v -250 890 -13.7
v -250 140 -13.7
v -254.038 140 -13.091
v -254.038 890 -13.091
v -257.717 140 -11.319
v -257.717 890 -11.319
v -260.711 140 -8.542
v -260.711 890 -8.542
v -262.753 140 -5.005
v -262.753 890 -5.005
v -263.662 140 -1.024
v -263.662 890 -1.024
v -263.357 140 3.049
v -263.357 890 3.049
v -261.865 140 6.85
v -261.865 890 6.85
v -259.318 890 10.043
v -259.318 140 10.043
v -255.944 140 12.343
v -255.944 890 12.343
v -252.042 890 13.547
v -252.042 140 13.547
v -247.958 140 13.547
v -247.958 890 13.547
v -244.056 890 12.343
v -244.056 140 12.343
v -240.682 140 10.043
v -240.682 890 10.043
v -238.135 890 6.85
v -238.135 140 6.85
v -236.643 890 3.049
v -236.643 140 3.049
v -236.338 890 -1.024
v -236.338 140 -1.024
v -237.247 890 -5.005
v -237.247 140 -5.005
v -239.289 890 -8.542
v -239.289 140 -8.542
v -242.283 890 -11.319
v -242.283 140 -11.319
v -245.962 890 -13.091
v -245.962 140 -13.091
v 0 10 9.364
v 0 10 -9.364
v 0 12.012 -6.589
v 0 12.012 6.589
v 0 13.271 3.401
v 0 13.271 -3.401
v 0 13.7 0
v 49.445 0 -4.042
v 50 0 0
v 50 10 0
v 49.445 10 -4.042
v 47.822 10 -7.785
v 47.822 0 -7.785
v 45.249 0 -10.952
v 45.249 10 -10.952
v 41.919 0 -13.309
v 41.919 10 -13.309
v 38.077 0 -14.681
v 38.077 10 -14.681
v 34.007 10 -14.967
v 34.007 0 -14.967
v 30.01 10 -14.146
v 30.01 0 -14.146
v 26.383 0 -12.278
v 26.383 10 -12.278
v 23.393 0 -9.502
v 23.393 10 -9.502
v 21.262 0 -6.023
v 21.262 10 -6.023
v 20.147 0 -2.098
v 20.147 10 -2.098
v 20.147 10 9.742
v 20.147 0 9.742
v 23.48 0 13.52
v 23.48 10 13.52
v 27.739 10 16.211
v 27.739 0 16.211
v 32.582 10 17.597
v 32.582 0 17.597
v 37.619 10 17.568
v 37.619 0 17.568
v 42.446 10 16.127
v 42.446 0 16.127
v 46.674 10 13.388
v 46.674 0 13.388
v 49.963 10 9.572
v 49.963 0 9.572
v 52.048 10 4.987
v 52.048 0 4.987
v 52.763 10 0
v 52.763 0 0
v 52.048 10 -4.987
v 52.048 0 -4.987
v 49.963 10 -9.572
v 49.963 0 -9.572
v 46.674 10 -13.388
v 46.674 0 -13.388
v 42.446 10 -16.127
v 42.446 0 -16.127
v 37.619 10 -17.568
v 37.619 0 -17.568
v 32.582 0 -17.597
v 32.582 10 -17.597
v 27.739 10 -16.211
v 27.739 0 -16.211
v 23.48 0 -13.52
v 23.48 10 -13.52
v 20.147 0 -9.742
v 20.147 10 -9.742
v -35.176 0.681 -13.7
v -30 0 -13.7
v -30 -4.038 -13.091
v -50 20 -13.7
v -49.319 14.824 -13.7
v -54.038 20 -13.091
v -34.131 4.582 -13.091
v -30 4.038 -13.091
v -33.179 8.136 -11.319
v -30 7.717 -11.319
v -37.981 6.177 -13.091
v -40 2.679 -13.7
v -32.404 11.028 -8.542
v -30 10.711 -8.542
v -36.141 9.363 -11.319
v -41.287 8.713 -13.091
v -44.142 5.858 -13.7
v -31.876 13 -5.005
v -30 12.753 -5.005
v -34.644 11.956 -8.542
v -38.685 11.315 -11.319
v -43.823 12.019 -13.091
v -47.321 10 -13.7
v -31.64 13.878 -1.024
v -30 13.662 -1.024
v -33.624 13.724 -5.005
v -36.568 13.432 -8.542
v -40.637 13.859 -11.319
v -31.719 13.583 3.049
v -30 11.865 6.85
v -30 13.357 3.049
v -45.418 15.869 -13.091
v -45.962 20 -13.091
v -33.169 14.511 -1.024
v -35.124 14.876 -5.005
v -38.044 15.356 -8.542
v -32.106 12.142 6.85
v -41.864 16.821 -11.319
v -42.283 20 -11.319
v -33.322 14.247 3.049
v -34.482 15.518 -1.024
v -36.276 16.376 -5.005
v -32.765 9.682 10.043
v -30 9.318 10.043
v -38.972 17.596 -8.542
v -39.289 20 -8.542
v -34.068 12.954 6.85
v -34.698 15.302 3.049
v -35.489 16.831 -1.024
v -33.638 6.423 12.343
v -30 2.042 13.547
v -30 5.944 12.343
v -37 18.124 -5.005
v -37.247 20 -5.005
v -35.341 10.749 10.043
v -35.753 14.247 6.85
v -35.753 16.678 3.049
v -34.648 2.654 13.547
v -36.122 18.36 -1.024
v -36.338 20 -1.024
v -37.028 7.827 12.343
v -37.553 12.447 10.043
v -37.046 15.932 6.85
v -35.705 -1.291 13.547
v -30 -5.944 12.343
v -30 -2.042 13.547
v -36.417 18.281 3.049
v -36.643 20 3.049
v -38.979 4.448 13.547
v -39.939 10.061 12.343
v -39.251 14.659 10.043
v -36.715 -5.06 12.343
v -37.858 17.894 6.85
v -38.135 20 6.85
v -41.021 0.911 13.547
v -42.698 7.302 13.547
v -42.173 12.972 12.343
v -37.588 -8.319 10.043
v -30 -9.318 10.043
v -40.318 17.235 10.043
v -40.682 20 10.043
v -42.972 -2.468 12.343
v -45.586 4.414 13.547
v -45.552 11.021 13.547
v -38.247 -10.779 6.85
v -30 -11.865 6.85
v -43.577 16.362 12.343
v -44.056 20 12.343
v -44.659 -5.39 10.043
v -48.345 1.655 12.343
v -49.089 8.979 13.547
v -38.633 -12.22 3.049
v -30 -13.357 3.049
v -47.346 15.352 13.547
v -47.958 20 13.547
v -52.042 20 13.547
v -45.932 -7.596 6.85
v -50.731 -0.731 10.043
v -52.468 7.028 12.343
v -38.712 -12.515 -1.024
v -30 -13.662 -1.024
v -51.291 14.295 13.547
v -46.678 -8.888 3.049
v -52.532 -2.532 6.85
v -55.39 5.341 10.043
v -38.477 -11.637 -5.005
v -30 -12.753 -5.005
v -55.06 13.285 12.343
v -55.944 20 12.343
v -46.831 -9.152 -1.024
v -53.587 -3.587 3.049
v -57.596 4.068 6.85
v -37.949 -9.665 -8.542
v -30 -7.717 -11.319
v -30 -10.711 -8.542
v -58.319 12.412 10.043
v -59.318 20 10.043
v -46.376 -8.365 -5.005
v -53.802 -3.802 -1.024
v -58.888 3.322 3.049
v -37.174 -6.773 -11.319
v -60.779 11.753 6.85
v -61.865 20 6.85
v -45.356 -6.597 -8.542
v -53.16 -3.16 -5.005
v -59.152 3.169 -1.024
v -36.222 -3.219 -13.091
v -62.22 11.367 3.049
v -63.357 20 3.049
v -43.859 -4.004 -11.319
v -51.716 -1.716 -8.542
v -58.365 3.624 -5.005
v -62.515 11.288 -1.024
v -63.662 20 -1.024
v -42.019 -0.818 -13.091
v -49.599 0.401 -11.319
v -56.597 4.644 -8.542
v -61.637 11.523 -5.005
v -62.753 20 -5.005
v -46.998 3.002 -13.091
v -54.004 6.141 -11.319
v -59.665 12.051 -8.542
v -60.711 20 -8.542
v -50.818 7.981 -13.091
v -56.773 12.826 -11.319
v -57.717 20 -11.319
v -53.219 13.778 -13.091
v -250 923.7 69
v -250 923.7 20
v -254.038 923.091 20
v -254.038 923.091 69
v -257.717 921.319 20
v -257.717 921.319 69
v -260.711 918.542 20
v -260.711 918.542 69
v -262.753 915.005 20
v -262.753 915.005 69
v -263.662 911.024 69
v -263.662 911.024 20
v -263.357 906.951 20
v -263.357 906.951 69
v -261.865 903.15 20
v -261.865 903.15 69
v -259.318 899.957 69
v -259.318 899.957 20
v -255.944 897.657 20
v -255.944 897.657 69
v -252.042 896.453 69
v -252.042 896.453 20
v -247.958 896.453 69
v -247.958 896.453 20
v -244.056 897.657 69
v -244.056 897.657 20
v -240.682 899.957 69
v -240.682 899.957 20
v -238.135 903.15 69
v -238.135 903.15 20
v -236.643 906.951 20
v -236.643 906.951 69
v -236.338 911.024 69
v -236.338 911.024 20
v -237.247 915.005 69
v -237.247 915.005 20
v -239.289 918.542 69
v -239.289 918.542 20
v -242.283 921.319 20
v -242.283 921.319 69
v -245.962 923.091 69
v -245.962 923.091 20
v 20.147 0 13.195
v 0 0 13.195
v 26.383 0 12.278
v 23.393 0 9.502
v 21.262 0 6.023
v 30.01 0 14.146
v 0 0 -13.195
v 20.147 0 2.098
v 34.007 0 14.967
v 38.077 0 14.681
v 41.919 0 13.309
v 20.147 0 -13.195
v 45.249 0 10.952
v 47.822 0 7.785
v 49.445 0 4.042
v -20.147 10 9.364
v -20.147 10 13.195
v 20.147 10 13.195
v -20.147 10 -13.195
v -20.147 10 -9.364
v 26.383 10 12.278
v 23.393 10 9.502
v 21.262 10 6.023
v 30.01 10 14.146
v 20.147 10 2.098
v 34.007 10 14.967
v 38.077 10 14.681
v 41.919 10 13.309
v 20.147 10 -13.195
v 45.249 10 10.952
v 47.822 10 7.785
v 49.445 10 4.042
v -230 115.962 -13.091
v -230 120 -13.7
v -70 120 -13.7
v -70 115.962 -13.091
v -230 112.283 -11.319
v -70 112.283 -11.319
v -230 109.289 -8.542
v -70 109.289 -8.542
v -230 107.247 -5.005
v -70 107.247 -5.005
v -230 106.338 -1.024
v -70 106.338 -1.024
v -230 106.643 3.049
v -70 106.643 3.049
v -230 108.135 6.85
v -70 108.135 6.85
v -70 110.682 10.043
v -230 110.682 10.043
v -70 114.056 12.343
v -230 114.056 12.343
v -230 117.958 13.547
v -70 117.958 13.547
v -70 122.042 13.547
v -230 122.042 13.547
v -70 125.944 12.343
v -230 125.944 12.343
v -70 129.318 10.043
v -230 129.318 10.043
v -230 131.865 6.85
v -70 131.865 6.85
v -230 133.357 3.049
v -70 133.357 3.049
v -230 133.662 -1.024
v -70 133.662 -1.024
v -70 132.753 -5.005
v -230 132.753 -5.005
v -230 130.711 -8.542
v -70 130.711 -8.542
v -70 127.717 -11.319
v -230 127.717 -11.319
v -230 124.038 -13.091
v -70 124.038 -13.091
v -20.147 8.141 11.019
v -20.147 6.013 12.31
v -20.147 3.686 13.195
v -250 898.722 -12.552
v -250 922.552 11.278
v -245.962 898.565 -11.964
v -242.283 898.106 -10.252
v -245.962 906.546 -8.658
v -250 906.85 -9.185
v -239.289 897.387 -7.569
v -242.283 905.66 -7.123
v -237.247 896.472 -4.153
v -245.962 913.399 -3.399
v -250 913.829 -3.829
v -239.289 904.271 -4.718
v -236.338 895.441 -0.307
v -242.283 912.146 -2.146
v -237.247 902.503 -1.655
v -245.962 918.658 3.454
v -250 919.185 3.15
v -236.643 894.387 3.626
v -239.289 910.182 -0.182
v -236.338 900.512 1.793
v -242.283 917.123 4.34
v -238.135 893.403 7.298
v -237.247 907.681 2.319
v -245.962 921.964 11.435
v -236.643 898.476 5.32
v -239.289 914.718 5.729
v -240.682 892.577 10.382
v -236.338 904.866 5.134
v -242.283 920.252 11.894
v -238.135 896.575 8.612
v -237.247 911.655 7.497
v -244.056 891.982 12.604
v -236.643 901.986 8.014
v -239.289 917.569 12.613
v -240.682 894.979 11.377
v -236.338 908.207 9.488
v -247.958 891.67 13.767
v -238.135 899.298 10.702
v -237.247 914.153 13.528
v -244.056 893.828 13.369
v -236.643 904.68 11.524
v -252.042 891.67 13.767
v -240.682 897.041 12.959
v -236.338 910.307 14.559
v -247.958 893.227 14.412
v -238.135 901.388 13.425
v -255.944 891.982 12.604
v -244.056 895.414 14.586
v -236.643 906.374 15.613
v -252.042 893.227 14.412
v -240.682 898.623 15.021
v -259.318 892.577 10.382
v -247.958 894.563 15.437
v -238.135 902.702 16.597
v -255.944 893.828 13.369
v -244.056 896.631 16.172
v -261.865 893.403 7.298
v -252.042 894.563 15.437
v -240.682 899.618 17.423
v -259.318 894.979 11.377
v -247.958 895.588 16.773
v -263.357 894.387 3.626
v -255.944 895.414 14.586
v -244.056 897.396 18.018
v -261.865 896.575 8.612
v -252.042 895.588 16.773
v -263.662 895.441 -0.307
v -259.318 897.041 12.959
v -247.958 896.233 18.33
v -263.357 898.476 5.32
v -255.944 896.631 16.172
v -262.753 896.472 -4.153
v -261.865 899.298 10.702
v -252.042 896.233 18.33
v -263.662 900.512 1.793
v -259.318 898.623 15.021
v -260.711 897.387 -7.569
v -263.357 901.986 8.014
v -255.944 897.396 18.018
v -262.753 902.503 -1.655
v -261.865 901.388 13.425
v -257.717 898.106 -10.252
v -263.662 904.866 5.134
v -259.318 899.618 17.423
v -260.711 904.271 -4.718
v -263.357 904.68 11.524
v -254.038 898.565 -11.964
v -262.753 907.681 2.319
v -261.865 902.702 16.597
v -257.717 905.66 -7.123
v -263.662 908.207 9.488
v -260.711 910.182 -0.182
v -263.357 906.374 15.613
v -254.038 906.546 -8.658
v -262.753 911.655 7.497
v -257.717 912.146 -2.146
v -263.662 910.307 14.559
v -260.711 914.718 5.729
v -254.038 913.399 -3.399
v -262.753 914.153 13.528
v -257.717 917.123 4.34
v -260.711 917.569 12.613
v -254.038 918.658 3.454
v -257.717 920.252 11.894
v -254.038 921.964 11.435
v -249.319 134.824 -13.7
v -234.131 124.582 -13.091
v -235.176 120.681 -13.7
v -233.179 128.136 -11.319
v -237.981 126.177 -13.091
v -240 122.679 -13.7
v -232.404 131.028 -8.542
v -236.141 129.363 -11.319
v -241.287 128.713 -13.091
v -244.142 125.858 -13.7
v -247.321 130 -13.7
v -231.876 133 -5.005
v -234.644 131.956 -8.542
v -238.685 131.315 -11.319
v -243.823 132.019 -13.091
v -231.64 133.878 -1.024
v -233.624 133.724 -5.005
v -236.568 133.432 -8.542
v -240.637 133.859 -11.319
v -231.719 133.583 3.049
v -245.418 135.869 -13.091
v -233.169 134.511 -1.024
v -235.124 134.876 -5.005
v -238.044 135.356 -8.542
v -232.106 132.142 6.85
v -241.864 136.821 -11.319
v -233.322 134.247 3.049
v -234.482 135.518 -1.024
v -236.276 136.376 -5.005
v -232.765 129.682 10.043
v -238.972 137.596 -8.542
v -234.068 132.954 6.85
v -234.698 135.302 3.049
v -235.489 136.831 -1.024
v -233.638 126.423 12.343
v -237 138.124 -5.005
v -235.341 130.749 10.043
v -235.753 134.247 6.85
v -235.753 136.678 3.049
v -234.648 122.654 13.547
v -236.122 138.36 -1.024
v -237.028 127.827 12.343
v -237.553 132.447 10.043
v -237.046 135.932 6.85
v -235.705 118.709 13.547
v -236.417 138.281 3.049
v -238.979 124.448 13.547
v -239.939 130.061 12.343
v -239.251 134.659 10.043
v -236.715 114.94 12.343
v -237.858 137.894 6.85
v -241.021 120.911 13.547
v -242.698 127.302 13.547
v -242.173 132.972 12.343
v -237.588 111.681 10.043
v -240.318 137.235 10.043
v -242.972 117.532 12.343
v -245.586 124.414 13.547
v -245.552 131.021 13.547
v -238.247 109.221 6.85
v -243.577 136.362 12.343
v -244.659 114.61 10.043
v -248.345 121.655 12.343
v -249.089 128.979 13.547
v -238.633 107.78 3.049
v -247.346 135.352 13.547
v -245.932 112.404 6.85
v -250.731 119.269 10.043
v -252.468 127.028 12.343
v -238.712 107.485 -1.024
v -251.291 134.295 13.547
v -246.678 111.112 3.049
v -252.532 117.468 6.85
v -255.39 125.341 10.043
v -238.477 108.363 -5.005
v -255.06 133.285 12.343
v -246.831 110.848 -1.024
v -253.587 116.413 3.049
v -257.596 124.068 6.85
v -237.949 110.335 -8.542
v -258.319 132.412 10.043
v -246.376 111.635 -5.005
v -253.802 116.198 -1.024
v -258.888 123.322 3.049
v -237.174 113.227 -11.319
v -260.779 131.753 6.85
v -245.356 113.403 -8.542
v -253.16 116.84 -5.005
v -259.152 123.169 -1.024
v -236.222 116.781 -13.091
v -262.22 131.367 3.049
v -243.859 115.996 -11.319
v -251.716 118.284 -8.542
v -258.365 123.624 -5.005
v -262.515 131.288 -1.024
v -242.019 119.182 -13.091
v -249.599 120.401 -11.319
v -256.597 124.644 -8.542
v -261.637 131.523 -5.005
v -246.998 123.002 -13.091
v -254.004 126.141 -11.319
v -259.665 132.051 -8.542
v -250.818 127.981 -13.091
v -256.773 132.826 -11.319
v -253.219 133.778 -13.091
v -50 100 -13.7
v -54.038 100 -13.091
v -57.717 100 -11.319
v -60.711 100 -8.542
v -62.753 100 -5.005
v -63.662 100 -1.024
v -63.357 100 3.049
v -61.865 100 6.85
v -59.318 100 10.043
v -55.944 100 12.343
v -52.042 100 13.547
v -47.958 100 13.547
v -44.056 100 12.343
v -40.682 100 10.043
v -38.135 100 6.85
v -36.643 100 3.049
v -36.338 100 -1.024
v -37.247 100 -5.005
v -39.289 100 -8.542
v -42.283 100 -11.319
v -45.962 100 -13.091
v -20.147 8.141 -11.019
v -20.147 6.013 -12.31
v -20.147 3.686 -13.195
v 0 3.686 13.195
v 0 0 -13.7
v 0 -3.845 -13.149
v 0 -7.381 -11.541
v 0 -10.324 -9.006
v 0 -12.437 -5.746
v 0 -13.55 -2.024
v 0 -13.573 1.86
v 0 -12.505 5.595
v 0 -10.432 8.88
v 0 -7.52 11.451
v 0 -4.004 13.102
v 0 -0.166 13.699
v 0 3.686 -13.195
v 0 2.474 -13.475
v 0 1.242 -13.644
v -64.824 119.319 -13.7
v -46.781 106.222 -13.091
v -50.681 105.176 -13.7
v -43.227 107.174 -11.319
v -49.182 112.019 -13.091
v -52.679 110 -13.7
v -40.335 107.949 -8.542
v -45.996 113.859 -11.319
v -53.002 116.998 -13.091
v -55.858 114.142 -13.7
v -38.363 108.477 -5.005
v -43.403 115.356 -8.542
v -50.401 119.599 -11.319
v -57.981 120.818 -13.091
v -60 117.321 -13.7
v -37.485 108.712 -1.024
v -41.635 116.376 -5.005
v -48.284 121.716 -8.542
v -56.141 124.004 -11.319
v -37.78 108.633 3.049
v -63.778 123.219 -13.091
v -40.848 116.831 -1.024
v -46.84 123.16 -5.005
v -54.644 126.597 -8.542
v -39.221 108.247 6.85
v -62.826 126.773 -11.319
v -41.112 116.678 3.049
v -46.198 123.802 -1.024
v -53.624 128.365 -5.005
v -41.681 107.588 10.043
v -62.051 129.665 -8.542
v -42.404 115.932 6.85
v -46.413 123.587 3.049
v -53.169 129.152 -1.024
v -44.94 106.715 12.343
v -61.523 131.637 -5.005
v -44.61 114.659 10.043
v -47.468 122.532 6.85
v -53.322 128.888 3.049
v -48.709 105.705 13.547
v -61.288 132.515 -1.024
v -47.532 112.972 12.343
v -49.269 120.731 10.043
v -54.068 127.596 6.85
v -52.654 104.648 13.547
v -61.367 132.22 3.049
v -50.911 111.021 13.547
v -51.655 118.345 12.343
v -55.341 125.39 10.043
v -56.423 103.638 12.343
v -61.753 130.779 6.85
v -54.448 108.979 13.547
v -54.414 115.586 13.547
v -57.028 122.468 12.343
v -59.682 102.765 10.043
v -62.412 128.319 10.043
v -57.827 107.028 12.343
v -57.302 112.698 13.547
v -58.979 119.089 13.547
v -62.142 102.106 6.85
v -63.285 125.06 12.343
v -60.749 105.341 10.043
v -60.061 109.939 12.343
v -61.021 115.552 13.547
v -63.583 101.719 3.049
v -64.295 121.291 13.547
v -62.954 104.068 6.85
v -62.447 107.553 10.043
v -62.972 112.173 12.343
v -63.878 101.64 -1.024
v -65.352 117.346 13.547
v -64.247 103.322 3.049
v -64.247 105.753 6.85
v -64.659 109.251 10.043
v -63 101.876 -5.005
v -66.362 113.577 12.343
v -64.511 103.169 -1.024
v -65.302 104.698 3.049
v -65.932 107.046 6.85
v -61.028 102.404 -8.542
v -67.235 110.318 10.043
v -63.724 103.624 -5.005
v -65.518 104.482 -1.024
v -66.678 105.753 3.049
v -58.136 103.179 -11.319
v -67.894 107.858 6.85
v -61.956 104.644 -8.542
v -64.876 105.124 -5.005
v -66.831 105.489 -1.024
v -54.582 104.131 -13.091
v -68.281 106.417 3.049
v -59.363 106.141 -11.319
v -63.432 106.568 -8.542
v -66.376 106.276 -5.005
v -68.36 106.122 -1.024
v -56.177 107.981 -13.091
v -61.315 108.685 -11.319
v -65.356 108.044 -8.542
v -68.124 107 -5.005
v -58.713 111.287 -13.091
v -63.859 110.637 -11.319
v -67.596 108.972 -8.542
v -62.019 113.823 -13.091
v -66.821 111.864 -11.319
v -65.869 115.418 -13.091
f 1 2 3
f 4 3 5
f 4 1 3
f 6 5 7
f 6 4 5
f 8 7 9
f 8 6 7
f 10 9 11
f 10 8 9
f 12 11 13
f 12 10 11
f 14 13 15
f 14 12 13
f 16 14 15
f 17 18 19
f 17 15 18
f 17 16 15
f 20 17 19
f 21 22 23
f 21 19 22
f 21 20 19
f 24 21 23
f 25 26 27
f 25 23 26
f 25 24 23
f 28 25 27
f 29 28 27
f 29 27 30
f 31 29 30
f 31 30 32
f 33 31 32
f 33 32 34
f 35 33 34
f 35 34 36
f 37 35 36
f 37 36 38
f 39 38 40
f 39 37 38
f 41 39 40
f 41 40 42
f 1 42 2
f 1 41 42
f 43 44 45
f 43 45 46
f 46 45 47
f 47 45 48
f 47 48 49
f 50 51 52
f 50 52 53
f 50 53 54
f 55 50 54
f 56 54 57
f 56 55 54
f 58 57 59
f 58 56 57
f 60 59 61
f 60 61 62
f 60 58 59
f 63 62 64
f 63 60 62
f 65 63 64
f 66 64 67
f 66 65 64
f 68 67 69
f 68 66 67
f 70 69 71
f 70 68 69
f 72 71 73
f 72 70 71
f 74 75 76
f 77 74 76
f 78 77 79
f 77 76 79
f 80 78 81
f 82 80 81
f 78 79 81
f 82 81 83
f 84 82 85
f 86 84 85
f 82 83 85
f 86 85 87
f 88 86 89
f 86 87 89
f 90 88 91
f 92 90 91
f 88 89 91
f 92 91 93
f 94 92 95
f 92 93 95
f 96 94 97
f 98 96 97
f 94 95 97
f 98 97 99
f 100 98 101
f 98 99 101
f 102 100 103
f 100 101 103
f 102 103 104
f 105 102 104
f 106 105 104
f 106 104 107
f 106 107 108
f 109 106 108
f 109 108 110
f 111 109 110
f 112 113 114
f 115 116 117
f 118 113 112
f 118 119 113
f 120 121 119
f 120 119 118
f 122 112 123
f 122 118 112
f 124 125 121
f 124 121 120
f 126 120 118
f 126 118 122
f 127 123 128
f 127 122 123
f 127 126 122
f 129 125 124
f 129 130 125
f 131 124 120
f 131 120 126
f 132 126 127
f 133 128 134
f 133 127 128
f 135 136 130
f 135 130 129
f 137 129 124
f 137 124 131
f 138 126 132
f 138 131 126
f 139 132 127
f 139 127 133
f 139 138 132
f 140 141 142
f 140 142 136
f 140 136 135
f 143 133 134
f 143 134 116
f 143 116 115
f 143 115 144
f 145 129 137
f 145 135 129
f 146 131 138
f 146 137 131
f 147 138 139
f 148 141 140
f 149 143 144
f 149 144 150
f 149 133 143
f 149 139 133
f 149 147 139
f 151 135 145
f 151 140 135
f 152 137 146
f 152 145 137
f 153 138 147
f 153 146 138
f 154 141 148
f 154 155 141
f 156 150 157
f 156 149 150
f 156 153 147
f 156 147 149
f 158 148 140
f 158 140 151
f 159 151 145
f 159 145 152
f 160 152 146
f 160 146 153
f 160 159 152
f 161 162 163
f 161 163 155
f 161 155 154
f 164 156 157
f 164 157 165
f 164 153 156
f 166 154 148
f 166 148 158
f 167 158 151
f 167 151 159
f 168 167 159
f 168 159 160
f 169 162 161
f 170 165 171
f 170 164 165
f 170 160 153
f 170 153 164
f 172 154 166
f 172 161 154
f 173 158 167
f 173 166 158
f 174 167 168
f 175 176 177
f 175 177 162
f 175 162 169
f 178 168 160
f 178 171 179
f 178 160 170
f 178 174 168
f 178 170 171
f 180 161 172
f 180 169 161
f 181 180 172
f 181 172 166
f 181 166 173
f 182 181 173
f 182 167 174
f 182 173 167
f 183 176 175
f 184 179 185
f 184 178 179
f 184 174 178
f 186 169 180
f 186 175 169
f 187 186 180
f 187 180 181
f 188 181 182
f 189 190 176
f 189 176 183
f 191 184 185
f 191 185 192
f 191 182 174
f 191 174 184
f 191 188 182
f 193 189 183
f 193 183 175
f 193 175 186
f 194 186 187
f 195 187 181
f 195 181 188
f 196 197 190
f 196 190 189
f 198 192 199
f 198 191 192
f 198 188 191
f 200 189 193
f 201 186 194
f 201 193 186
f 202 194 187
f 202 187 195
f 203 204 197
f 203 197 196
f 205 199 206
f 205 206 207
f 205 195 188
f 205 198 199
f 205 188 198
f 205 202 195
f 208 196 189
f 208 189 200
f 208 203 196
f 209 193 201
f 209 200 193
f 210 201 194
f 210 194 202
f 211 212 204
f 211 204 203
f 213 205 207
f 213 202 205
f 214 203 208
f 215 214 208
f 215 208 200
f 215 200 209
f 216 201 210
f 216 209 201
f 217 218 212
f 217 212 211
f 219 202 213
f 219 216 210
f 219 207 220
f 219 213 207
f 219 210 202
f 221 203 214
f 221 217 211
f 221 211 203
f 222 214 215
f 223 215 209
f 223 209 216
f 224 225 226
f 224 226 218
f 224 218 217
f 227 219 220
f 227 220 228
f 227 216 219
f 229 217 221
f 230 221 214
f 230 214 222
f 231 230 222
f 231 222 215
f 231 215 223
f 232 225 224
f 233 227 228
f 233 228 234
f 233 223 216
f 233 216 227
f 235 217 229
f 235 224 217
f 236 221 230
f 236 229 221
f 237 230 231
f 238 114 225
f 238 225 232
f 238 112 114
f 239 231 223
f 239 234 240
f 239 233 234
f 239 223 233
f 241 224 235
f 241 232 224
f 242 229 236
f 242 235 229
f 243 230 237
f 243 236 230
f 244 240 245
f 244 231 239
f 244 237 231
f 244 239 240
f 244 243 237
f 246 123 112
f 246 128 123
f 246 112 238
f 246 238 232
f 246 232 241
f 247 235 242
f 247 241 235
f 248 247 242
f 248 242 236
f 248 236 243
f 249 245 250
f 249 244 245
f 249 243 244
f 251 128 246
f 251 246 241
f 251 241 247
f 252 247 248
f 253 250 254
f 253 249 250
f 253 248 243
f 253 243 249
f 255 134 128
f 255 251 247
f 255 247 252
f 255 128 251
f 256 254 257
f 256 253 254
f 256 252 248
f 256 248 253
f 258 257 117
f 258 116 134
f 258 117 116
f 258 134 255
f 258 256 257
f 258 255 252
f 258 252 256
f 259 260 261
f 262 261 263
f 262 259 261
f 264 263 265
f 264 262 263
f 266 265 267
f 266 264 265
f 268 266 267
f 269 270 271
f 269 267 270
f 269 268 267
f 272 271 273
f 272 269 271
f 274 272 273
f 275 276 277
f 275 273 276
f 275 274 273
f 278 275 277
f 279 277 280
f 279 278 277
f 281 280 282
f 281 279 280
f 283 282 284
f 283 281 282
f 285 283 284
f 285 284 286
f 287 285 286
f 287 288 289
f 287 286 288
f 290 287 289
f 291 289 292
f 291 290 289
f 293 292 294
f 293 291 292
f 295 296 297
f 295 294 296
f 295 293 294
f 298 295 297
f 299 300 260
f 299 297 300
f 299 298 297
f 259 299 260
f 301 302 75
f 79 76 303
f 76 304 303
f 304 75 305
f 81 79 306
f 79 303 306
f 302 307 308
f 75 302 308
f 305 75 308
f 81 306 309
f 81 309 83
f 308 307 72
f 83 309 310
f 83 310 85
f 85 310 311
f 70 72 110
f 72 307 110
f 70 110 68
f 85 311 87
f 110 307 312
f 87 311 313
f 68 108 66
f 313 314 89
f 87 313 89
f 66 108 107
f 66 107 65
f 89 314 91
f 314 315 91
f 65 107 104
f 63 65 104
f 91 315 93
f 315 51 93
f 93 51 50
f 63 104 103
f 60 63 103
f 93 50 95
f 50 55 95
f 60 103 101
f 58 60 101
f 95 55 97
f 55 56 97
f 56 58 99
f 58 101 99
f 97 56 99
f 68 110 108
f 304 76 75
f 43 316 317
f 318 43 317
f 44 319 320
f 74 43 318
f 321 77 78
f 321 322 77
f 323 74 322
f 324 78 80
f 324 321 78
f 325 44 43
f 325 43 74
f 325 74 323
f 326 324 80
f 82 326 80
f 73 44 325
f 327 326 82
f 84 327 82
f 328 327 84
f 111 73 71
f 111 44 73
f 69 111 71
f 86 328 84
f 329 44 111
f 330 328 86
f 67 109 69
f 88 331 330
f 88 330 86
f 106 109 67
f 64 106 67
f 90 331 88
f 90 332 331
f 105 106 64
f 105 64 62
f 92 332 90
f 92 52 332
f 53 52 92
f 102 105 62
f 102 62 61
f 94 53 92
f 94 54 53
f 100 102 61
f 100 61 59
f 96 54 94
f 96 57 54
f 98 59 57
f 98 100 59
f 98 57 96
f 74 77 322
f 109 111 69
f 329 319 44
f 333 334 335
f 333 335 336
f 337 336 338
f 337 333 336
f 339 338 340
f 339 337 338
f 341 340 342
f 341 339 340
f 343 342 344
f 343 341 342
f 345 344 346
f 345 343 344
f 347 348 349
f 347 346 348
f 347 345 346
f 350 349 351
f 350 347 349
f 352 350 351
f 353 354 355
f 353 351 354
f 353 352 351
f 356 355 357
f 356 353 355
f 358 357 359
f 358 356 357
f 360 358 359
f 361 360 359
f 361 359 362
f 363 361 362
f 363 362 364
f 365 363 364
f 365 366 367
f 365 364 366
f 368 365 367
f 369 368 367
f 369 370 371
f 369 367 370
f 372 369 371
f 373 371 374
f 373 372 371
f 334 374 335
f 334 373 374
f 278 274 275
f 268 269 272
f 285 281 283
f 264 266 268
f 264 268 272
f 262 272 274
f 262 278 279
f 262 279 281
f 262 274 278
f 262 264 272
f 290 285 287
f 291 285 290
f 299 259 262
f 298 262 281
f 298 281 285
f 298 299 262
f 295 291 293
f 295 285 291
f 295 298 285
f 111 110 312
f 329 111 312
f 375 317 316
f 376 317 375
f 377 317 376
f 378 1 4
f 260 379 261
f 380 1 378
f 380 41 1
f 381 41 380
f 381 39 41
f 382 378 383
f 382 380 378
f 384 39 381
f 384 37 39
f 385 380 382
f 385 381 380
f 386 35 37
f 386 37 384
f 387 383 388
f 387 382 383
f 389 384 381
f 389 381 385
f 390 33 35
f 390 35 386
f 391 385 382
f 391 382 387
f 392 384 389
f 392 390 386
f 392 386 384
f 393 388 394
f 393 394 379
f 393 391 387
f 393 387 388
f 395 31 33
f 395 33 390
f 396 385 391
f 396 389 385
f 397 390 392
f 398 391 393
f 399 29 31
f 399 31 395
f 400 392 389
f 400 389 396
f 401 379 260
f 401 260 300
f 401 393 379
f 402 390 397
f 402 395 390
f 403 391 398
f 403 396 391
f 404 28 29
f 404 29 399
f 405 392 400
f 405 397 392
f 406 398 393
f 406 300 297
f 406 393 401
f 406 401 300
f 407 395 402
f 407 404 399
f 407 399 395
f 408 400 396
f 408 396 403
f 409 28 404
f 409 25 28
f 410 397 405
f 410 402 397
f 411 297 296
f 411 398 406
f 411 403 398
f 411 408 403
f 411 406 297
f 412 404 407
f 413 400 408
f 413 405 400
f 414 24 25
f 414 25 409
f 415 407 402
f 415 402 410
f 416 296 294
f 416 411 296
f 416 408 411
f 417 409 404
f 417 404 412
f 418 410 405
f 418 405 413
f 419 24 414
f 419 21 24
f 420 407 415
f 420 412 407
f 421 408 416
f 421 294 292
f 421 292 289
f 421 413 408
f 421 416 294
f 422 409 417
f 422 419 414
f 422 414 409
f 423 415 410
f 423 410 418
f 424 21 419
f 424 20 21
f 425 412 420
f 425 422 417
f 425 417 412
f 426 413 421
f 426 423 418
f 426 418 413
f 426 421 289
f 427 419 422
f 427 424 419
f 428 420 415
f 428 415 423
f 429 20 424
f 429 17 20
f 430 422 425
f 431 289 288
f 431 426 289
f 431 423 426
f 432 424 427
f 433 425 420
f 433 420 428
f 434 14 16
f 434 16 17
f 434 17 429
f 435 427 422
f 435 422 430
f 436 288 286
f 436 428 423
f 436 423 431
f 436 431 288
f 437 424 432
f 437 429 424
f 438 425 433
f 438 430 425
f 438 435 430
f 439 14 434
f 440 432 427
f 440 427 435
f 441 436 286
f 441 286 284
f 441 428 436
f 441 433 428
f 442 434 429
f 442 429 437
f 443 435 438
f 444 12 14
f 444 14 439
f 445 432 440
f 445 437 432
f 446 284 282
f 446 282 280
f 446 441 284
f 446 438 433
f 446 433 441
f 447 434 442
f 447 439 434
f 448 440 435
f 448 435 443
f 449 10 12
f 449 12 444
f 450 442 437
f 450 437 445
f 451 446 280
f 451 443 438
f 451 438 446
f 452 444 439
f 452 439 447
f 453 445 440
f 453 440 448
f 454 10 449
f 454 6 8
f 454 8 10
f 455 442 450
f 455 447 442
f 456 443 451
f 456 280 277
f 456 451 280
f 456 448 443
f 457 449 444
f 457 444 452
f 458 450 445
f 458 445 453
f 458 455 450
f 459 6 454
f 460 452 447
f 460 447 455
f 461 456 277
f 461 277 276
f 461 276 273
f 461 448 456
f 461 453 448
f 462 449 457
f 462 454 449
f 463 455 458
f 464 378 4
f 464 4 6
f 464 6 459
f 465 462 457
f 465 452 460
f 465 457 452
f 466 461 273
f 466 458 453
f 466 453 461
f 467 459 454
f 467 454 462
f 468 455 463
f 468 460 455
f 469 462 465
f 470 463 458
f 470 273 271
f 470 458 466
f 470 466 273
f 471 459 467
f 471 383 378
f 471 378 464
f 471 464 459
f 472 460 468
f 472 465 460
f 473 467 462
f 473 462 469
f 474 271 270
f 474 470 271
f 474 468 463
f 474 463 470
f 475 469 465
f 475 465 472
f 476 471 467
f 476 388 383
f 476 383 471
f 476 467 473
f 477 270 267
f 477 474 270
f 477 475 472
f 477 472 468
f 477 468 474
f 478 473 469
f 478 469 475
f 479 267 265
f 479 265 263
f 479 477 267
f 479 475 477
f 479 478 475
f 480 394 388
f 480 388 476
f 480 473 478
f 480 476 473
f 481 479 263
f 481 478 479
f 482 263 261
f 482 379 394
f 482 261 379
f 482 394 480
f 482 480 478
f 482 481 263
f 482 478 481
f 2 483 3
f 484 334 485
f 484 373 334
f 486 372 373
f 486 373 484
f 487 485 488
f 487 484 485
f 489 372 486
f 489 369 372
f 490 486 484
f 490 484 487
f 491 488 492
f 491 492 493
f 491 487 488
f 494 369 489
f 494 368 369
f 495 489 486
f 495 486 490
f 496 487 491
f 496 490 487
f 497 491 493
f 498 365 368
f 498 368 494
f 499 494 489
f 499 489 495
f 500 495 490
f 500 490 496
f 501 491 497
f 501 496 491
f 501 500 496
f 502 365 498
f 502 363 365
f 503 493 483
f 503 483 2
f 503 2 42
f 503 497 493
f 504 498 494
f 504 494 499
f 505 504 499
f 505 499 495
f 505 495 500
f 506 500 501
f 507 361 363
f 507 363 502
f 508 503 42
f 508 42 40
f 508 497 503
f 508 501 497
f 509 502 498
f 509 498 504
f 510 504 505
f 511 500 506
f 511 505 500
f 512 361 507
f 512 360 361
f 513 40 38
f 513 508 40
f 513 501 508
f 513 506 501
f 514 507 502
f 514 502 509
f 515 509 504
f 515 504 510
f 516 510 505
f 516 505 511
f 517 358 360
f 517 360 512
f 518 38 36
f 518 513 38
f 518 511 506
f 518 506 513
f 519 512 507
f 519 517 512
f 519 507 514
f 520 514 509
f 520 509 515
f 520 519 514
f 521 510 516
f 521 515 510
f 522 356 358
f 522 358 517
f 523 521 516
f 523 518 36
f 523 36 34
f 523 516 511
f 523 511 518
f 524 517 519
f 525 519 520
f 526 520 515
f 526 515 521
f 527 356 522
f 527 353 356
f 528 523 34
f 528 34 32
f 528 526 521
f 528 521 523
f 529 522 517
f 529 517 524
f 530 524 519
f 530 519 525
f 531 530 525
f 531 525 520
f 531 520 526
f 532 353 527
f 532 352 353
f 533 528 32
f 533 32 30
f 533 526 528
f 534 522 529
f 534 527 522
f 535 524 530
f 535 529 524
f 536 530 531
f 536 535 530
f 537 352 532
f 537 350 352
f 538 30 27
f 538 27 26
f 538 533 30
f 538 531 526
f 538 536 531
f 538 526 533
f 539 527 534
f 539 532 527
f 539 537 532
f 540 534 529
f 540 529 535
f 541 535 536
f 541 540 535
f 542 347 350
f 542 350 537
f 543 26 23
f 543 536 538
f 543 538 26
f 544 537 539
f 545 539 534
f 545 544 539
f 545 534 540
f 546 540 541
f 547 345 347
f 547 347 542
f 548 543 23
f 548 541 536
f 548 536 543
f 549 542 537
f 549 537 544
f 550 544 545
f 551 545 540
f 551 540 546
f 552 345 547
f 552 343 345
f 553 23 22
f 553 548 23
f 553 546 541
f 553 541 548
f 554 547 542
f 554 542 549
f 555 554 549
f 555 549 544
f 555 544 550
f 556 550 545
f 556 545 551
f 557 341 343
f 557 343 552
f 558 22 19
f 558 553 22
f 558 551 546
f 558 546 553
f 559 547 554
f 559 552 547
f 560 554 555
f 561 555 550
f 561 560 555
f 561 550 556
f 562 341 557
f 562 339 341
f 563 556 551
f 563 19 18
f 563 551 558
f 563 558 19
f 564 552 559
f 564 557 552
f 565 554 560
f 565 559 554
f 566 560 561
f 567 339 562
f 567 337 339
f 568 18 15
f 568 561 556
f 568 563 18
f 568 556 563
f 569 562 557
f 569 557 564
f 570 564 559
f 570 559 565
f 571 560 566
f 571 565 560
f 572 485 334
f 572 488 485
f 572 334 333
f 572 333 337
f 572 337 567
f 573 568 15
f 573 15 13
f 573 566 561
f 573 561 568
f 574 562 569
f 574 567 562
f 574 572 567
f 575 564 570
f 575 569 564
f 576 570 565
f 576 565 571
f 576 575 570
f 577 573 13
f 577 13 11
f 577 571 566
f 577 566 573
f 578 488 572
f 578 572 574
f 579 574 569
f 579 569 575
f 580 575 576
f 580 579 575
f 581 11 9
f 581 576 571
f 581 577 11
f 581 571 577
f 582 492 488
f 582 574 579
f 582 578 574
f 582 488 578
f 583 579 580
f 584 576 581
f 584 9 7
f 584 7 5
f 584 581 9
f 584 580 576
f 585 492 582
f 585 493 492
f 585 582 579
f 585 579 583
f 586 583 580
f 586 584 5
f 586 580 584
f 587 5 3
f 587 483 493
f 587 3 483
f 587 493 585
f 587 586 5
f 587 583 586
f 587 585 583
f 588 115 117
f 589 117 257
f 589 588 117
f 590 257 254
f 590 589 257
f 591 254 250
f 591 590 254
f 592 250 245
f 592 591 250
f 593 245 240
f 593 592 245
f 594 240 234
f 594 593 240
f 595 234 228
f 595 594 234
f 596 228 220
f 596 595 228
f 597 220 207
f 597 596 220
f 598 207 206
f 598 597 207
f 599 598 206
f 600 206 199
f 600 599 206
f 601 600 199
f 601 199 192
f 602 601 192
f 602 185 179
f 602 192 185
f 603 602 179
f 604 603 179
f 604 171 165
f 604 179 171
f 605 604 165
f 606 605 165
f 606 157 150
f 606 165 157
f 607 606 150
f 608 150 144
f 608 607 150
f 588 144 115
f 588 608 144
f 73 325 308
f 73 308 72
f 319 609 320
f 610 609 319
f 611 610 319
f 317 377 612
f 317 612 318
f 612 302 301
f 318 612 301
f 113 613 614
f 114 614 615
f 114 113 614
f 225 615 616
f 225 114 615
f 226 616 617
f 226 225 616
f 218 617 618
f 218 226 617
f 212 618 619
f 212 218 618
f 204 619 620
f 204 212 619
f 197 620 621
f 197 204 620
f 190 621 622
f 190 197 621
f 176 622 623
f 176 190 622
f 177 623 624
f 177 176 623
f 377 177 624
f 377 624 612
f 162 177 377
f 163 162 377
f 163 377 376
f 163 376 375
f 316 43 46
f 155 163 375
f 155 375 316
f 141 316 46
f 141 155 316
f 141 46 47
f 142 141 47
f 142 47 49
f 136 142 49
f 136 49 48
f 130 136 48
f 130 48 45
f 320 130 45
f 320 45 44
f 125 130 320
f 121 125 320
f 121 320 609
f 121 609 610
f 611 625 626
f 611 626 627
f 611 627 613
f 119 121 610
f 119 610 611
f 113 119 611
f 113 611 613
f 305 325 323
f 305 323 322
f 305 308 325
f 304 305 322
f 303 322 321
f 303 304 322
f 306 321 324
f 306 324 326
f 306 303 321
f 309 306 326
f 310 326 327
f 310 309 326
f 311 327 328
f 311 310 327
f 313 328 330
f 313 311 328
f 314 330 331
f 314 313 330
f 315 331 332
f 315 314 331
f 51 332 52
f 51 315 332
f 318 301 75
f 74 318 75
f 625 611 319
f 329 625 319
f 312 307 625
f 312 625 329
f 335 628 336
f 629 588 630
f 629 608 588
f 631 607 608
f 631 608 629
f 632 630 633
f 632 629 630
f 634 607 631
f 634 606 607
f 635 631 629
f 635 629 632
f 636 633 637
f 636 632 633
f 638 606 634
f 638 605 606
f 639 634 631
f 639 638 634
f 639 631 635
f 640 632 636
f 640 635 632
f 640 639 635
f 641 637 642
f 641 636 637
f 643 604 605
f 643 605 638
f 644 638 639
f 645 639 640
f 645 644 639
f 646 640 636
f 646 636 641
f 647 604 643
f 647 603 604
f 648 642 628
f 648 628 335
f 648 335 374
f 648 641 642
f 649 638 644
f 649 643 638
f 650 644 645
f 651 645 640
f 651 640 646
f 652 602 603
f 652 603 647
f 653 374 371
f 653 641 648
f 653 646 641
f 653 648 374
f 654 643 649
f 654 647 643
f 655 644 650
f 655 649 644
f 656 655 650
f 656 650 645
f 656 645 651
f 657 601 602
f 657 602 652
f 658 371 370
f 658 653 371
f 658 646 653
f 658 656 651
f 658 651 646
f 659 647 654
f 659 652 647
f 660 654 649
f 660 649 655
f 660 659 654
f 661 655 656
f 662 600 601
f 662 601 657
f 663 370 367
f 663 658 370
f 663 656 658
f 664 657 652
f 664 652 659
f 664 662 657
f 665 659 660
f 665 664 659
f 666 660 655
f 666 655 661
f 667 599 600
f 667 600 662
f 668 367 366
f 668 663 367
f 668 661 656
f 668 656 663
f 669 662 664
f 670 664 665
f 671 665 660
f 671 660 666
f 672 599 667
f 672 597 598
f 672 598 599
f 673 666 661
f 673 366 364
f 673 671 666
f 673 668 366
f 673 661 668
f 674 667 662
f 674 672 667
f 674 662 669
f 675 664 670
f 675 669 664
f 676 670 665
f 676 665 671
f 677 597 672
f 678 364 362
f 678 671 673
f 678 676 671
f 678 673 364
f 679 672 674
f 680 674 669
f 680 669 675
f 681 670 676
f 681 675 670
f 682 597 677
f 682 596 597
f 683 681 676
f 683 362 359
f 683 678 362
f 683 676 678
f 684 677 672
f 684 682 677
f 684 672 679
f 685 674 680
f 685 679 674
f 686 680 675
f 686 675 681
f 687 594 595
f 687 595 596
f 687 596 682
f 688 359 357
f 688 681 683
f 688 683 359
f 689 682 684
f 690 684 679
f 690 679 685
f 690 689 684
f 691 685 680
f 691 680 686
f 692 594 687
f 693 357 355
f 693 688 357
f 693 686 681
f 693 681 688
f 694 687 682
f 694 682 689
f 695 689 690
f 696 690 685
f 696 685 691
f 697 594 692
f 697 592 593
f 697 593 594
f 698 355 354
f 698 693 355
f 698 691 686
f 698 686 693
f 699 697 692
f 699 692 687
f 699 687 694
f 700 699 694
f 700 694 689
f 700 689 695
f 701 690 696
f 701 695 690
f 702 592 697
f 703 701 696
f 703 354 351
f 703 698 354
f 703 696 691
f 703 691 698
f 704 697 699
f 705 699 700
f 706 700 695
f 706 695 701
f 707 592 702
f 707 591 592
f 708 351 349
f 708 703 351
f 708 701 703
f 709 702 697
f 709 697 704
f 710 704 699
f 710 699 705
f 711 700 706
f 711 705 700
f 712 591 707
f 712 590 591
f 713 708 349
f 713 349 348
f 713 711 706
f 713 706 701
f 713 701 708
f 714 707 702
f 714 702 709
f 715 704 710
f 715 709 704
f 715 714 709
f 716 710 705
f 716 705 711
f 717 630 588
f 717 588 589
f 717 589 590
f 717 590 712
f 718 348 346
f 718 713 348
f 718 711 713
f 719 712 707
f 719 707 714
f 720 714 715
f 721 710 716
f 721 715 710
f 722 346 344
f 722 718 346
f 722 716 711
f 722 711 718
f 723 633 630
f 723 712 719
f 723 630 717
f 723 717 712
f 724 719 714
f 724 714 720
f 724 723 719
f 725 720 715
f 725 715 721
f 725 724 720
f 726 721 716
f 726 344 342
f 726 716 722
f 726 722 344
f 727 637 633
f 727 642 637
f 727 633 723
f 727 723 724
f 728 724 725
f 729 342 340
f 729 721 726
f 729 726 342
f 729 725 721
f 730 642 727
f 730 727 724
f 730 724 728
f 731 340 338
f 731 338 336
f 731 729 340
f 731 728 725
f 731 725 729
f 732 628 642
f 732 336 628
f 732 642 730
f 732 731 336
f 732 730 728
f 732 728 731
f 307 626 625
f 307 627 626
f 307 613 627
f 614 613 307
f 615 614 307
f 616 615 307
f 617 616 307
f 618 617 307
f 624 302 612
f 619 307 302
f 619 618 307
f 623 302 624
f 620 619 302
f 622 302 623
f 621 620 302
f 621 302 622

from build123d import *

# Parameters (mm, degrees)
CROQUIS1_R              = 13.7
CROQUIS2_W              = 104.810760898
CROQUIS2_H              = 208.017118972
CORTAR_EXTRUIR2_DEPTH   = 81
CROQUIS3_R              = 17.762543943
CROQUIS3_R_2            = 15
SALIENTE_EXTRUIR1_DEPTH = 10
CROQUIS4_W              = 40.294914154
CROQUIS4_H              = 26.389647966
SALIENTE_EXTRUIR2_DEPTH = 10


with BuildPart() as part:
    # Barrer1: sweep along a curve in space
    with BuildLine() as barrer1_path:
        Line((0, 0, 0), (-30, 0, 0))
        ThreePointArc((-30, 0, 0), (-44.142135624, 5.857864376, 0), (-50, 20, 0))
        Line((-50, 20, 0), (-50, 100, 0))
        ThreePointArc((-50, 100, 0), (-55.857864376, 114.142135624, 0), (-70, 120, 0))
        Line((-70, 120, 0), (-230, 120, 0))
        ThreePointArc((-230, 120, 0), (-244.142135624, 125.857864376, 0), (-250, 140, 0))
        Line((-250, 140, 0), (-250, 890, 0))
        ThreePointArc((-250, 890, 0), (-250, 904.142135624, 5.857864376), (-250, 910, 20))
        Line((-250, 910, 20), (-250, 910, 80))
        ThreePointArc((-250, 910, 80), (-250, 915.857864376, 94.142135624), (-250, 930, 100))
        Line((-250, 930, 100), (-250, 940, 100))
        ThreePointArc((-250, 940, 100), (-250, 954.142135624, 105.857864376), (-250, 960, 120))
        Line((-250, 960, 120), (-250, 960, 150))
    # Croquis1 → Barrer1 (sweep)
    with BuildSketch(Plane(origin=(0, 0, 0), x_dir=(0, 0, -1), z_dir=(1, 0, 0))):
        Circle(CROQUIS1_R)
    sweep(path=barrer1_path.line)

    # Croquis2 → Cortar-Extruir2 (cut)
    with BuildSketch(Plane.XY.offset(150)):
        with Locations((-250, 960)):
            Rectangle(CROQUIS2_W, CROQUIS2_H)
    extrude(amount=-CORTAR_EXTRUIR2_DEPTH, mode=Mode.SUBTRACT)



with BuildPart() as body_2:
    # Croquis3 → Saliente-Extruir1 (new body)
    with BuildSketch(Plane(origin=(0, 0, 0), x_dir=(1, 0, 0), z_dir=(0, 1, 0))):
        with Locations((35, 0)):
            Circle(CROQUIS3_R)
        with Locations((35, 0)):
            Circle(CROQUIS3_R_2, mode=Mode.SUBTRACT)
    extrude(amount=SALIENTE_EXTRUIR1_DEPTH)


with BuildPart() as part_1:
    add(part.part)

    add(body_2.part)  # Saliente-Extruir2 merges body 2
    # Croquis4 → Saliente-Extruir2 (add)
    with BuildSketch(Plane(origin=(0, 0, 0), x_dir=(1, 0, 0), z_dir=(0, 1, 0))):
        Rectangle(CROQUIS4_W, CROQUIS4_H)
    extrude(amount=SALIENTE_EXTRUIR2_DEPTH)


solid = part_1.part
